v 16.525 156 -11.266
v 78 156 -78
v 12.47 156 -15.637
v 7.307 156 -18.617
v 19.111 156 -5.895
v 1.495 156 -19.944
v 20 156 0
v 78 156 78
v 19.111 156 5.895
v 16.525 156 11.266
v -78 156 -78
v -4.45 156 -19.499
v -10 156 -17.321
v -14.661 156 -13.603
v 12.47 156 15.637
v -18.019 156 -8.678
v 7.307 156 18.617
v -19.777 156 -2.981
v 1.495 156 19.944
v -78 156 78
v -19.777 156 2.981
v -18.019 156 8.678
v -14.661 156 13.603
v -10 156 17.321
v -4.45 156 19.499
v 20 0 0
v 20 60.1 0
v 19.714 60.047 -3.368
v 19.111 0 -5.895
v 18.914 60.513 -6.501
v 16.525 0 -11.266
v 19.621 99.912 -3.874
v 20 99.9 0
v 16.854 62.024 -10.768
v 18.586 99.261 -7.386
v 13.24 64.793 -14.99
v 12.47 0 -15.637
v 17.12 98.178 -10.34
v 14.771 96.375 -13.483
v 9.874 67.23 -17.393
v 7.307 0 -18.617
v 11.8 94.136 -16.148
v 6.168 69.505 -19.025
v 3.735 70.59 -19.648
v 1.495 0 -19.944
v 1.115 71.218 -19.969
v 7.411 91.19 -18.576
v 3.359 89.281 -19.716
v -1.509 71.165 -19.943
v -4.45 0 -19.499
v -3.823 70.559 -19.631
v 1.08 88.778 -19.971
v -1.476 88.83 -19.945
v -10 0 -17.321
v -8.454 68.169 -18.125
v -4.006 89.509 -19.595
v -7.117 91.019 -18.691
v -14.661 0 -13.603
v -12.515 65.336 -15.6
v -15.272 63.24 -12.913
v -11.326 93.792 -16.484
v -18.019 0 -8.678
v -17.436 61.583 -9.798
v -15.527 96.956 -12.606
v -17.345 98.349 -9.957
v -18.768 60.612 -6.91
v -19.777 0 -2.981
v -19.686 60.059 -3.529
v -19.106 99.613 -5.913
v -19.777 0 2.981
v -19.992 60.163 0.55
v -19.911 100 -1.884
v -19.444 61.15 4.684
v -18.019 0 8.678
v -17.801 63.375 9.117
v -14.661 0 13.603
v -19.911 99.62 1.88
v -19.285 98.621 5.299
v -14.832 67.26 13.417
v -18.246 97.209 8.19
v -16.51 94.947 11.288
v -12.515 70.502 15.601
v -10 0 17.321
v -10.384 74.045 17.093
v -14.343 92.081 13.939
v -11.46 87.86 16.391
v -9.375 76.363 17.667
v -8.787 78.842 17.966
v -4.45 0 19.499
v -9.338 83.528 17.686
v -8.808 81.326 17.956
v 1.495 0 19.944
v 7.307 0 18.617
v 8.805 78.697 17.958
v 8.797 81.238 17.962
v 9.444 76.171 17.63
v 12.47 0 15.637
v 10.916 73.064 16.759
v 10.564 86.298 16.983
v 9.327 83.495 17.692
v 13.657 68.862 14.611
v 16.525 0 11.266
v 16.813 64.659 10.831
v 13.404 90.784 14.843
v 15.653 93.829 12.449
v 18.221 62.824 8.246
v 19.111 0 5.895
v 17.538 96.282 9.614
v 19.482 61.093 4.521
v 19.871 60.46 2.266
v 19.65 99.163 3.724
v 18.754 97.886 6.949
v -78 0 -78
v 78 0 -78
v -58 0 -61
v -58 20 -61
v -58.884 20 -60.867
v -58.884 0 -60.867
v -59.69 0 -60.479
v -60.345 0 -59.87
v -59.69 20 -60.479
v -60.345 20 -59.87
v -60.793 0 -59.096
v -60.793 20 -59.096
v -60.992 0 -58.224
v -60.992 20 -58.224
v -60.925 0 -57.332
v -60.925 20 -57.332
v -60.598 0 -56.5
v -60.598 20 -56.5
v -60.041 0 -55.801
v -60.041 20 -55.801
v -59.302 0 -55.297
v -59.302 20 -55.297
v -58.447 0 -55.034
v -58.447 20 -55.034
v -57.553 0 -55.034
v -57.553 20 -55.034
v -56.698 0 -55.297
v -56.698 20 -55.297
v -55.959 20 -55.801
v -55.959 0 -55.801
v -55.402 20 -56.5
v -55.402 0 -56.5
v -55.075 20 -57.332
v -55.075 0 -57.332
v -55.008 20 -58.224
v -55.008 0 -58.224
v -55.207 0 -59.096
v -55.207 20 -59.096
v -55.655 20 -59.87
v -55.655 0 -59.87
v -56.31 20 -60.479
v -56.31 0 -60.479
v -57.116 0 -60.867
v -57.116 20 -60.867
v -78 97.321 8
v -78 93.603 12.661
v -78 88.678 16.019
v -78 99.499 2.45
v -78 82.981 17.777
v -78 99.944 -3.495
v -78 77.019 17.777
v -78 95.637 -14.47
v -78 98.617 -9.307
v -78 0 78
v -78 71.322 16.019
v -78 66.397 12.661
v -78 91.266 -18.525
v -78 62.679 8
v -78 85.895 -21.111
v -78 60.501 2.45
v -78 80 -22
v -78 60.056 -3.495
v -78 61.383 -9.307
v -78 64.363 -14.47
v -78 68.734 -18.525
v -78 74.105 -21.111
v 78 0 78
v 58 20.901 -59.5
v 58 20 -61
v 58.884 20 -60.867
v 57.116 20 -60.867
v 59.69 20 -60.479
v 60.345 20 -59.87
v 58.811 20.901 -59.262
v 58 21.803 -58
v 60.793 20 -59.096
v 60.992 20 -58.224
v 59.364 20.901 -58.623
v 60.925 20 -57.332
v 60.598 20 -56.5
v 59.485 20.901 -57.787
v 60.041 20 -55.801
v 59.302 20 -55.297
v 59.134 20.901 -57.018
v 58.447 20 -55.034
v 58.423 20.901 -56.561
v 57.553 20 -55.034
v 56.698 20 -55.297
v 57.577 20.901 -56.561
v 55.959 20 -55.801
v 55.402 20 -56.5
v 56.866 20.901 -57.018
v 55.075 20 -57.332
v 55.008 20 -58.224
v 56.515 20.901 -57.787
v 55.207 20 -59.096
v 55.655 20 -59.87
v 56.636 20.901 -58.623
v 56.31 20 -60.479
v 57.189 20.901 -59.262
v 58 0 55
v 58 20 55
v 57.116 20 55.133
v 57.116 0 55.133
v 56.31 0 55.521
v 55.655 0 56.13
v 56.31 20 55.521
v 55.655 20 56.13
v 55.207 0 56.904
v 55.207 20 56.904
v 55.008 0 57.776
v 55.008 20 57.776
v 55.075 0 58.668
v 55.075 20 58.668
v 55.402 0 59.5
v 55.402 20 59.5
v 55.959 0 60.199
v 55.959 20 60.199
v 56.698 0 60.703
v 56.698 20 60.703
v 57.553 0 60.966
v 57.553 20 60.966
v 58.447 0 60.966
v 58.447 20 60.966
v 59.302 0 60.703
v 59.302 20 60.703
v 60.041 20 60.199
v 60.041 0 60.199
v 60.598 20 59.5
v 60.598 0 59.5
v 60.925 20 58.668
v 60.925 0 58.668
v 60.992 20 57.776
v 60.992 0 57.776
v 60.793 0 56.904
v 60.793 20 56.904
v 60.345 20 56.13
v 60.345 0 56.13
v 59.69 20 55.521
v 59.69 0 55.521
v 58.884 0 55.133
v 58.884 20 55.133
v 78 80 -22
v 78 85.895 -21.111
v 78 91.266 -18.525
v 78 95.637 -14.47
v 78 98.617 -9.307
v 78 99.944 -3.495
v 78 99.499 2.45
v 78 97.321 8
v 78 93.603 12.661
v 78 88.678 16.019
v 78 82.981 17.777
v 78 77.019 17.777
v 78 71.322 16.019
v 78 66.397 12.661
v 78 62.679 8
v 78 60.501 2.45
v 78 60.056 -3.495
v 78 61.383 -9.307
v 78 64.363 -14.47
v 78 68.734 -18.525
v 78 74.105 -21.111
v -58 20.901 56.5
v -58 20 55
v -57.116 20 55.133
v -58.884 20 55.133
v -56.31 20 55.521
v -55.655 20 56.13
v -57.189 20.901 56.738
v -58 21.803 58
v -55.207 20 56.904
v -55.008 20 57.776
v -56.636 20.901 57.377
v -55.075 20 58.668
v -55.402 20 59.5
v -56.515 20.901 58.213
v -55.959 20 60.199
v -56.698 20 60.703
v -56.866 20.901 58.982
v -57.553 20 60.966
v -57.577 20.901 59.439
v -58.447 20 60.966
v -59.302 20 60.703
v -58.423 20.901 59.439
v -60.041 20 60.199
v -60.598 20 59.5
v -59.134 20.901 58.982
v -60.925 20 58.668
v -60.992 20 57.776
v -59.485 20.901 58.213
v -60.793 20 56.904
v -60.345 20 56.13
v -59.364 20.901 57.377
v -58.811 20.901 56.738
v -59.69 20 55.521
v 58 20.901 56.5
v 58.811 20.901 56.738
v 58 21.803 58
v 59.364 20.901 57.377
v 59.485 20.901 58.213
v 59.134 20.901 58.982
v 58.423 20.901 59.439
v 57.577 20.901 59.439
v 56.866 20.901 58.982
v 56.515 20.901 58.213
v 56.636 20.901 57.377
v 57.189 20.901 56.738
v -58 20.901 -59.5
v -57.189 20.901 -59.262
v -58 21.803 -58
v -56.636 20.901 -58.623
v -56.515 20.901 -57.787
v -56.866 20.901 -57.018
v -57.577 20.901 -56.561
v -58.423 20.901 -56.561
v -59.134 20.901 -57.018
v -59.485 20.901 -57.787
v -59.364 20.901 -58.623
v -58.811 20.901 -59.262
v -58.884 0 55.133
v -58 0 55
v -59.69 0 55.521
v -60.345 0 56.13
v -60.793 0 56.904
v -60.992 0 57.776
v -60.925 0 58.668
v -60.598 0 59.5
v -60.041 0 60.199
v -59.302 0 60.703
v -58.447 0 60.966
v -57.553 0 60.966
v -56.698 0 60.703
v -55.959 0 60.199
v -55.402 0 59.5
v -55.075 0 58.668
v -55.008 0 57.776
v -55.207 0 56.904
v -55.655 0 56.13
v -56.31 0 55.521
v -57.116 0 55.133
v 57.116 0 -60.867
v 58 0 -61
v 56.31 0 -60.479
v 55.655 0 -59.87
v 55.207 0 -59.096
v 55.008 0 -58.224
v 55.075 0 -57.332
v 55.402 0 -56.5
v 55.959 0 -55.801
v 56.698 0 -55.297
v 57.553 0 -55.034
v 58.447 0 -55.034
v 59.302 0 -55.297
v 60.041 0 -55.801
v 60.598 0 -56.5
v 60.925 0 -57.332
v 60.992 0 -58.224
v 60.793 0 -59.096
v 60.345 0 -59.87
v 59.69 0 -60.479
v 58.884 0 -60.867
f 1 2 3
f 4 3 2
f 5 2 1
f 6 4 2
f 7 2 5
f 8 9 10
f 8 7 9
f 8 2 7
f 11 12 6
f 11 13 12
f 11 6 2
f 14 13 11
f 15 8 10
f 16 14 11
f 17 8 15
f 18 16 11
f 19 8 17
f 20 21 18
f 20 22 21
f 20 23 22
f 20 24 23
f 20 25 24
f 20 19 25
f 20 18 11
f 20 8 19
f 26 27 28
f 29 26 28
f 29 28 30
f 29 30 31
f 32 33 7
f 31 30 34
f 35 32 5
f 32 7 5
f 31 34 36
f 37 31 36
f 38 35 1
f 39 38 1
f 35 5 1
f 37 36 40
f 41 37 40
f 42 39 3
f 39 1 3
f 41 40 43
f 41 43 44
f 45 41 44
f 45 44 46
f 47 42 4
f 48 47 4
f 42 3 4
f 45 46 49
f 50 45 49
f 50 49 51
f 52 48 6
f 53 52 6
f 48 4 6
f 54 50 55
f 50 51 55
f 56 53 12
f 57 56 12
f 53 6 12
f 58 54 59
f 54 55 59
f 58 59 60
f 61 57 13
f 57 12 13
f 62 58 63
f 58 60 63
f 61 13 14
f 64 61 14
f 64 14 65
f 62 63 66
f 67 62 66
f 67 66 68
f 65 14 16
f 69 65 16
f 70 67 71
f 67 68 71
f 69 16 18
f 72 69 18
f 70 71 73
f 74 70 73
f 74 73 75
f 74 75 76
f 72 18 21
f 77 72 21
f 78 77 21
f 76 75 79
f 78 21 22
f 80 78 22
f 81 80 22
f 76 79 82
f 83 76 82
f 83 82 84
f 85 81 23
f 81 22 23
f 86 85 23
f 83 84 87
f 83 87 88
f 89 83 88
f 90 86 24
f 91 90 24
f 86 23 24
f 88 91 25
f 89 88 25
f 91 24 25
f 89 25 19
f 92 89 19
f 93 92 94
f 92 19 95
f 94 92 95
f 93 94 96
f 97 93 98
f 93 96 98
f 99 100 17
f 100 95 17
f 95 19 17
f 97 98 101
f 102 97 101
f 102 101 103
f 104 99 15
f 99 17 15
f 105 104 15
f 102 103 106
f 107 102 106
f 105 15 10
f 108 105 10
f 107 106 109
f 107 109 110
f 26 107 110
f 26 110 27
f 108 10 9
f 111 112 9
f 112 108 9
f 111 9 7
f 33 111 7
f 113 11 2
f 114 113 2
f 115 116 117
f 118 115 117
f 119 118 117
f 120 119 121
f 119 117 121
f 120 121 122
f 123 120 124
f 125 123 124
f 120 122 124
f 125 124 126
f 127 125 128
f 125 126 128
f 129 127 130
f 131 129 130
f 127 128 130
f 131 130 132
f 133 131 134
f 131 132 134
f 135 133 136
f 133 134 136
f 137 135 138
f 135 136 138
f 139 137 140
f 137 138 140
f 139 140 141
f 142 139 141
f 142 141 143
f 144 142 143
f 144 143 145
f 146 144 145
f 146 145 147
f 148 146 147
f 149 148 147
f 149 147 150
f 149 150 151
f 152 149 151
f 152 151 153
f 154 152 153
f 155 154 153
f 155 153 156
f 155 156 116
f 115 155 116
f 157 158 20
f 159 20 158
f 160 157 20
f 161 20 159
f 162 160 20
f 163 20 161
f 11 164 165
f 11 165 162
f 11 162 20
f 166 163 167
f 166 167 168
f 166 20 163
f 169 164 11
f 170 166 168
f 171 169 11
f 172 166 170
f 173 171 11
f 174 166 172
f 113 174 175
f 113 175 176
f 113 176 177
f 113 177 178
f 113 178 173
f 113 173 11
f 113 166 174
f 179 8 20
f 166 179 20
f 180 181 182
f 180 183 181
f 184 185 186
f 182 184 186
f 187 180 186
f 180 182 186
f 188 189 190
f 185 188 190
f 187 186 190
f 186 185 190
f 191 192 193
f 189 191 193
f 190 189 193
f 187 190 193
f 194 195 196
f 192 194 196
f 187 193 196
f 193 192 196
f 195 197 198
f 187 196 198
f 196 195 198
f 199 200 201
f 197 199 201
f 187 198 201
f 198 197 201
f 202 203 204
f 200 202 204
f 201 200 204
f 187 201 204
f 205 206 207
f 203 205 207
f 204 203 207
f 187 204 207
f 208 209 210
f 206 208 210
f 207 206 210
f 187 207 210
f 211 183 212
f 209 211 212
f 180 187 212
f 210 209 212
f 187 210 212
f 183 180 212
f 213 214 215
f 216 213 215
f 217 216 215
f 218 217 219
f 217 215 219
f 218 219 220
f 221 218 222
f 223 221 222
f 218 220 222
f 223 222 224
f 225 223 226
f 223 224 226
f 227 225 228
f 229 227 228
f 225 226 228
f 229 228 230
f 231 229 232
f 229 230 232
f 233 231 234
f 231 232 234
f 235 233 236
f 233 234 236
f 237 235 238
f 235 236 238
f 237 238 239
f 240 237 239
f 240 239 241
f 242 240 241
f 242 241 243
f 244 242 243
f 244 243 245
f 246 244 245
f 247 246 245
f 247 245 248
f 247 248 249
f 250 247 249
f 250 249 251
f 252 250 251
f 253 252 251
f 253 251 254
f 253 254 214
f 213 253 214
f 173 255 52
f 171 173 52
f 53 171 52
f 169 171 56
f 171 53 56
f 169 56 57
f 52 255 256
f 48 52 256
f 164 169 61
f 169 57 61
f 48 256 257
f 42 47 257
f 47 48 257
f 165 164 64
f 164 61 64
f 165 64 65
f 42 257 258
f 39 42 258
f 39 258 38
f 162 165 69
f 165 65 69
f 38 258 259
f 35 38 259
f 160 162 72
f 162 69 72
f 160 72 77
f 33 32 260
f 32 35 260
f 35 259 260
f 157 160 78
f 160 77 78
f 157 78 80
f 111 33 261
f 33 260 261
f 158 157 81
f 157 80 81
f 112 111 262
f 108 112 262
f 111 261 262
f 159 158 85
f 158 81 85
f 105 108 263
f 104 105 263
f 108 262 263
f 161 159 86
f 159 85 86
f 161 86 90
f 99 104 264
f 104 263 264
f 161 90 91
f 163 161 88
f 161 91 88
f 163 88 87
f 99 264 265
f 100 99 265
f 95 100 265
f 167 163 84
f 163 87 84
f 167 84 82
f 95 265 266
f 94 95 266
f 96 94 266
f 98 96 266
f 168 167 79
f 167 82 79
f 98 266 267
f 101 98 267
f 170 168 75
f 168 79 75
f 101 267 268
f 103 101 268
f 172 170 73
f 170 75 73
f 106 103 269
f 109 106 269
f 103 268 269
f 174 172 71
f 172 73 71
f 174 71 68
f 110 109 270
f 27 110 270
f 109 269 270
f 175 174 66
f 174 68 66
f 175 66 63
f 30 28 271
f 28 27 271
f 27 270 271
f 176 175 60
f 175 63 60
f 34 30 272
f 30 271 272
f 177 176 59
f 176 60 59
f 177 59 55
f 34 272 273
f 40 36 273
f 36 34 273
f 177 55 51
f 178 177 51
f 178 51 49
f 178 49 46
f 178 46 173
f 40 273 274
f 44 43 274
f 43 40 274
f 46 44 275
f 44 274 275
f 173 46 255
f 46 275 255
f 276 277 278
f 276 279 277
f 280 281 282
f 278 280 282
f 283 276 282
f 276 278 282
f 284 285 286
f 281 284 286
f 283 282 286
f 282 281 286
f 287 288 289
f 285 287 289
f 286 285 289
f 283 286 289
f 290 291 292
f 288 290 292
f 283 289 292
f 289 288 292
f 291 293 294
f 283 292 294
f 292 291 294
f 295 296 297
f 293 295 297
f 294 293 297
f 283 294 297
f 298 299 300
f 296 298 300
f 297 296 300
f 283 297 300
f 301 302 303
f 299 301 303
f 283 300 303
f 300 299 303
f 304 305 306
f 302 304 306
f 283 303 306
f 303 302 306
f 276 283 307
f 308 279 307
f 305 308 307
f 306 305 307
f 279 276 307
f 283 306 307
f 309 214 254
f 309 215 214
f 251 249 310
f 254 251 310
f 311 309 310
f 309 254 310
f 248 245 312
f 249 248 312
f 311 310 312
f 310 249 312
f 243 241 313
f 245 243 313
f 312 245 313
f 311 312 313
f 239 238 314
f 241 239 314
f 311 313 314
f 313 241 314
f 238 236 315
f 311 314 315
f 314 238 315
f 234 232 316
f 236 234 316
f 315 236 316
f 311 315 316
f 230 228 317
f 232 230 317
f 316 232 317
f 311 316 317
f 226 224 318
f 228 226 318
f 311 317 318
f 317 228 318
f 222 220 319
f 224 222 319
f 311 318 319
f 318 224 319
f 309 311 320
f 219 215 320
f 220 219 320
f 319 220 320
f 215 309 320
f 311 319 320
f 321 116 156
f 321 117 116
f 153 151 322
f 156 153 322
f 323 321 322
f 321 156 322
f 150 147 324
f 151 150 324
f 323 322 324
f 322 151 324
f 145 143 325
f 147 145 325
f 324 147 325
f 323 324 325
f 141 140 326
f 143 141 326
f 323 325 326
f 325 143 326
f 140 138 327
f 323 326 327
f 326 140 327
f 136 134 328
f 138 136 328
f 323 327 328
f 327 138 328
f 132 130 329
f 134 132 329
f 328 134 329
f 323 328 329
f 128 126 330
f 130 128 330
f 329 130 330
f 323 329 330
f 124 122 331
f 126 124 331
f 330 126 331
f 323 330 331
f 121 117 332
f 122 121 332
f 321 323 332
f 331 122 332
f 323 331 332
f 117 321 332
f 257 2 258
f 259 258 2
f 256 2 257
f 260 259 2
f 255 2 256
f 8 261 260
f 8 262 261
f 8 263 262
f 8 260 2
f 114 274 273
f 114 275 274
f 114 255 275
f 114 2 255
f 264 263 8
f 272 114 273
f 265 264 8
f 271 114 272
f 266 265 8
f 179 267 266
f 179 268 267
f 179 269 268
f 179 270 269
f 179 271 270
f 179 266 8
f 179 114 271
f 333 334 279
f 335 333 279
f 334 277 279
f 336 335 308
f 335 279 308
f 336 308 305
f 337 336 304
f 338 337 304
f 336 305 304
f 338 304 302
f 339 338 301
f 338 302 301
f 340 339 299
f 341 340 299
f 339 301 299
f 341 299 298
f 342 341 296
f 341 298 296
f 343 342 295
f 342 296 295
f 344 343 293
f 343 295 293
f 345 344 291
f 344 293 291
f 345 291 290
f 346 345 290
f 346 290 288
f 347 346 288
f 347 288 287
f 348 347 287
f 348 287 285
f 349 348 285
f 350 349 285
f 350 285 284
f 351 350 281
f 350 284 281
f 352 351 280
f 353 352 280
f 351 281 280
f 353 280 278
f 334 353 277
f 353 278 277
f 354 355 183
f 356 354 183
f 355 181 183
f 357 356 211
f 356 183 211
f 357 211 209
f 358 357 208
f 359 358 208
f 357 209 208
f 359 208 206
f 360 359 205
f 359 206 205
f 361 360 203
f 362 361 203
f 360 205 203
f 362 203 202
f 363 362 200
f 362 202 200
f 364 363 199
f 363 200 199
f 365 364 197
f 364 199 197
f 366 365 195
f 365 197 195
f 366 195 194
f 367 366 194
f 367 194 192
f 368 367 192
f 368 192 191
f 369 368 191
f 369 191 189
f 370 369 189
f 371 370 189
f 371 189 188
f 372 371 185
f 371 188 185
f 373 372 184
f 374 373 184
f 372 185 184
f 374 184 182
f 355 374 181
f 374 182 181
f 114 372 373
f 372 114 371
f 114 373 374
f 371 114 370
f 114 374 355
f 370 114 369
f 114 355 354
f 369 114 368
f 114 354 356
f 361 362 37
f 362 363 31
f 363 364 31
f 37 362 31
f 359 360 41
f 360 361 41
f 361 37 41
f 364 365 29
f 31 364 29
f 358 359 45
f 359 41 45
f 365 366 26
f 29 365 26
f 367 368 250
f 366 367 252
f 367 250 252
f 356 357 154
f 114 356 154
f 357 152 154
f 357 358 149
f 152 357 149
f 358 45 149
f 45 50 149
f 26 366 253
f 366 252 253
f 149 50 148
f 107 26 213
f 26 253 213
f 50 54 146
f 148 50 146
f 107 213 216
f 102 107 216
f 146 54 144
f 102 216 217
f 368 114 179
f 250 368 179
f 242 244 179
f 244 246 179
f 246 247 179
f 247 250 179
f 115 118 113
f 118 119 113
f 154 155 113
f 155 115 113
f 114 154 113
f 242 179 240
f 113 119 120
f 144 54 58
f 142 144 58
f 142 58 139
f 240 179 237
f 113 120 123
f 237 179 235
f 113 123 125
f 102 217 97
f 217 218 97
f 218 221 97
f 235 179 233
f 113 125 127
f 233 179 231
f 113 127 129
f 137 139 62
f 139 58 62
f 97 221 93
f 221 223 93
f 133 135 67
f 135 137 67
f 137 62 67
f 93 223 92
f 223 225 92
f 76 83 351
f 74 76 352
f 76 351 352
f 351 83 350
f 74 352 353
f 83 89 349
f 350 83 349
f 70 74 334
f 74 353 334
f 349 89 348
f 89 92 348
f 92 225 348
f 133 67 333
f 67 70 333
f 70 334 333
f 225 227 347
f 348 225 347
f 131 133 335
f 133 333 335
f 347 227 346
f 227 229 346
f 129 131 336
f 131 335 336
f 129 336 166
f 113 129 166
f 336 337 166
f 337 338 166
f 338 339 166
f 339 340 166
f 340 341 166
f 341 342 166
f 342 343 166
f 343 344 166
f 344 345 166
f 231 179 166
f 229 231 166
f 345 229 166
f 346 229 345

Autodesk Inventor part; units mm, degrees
ref_plane "YZ Plane" through (0, 0, 0) normal (1, 0, 0) x (0, 1, 0)
ref_plane "XZ Plane" through (0, 0, 0) normal (0, 1, 0) x (-1, 0, 0)
ref_plane "XY Plane" through (0, 0, 0) normal (0, 0, 1) x (1, 0, 0)
sketch "Sketch1" plane through (0, 0, 0) normal (0, 1, 0) x (-1, 0, 0)
  line L0 (-78, 78) -> (78, 78)
  line L1 (78, 78) -> (78, -78)
  line L2 (78, -78) -> (-78, -78)
  line L3 (-78, -78) -> (-78, 78)
  line L4 (-78, 78) -> (78, -78) construction
  line L5 (78, 78) -> (-78, -78) construction
  point P0 (0, 0)
  dimension "d0" = 156
  dimension "d1" = 156
extrude "Body" add sketch "Sketch1" along normal blind 156
sketch "Sketch2" plane through (78, 0, 78) normal (1, 0, 0) x (0, 0, -1)
  circle A0 centre (80, 80) radius 20
  point P0 (78, 0)
extrude "RotAxis" cut sketch "Sketch2" against normal through all
sketch "Sketch4" plane through (0, 156, 0) normal (0, 1, 0) x (1, 0, 0)
  circle A0 centre (0, 0) radius 20
extrude "CableHole" cut sketch "Sketch4" against normal through all
sketch "Sketch5" plane through (0, 0, 0) normal (0, -1, 0) x (1, 0, 0)
  point P0 (0, 0)
  point P1 (-58, 58)
  point P2 (-58, -58)
  point P3 (58, -58)
  point P4 (58, 58)
hole "BoltHoles" at (-58, 0, 58) at (-58, 0, -58) at (58, 0, -58) at (58, 0, 58) direction (0, 1, 0) diameter 6 depth 20 tip angle 118
properties part number "AxisConnector"
